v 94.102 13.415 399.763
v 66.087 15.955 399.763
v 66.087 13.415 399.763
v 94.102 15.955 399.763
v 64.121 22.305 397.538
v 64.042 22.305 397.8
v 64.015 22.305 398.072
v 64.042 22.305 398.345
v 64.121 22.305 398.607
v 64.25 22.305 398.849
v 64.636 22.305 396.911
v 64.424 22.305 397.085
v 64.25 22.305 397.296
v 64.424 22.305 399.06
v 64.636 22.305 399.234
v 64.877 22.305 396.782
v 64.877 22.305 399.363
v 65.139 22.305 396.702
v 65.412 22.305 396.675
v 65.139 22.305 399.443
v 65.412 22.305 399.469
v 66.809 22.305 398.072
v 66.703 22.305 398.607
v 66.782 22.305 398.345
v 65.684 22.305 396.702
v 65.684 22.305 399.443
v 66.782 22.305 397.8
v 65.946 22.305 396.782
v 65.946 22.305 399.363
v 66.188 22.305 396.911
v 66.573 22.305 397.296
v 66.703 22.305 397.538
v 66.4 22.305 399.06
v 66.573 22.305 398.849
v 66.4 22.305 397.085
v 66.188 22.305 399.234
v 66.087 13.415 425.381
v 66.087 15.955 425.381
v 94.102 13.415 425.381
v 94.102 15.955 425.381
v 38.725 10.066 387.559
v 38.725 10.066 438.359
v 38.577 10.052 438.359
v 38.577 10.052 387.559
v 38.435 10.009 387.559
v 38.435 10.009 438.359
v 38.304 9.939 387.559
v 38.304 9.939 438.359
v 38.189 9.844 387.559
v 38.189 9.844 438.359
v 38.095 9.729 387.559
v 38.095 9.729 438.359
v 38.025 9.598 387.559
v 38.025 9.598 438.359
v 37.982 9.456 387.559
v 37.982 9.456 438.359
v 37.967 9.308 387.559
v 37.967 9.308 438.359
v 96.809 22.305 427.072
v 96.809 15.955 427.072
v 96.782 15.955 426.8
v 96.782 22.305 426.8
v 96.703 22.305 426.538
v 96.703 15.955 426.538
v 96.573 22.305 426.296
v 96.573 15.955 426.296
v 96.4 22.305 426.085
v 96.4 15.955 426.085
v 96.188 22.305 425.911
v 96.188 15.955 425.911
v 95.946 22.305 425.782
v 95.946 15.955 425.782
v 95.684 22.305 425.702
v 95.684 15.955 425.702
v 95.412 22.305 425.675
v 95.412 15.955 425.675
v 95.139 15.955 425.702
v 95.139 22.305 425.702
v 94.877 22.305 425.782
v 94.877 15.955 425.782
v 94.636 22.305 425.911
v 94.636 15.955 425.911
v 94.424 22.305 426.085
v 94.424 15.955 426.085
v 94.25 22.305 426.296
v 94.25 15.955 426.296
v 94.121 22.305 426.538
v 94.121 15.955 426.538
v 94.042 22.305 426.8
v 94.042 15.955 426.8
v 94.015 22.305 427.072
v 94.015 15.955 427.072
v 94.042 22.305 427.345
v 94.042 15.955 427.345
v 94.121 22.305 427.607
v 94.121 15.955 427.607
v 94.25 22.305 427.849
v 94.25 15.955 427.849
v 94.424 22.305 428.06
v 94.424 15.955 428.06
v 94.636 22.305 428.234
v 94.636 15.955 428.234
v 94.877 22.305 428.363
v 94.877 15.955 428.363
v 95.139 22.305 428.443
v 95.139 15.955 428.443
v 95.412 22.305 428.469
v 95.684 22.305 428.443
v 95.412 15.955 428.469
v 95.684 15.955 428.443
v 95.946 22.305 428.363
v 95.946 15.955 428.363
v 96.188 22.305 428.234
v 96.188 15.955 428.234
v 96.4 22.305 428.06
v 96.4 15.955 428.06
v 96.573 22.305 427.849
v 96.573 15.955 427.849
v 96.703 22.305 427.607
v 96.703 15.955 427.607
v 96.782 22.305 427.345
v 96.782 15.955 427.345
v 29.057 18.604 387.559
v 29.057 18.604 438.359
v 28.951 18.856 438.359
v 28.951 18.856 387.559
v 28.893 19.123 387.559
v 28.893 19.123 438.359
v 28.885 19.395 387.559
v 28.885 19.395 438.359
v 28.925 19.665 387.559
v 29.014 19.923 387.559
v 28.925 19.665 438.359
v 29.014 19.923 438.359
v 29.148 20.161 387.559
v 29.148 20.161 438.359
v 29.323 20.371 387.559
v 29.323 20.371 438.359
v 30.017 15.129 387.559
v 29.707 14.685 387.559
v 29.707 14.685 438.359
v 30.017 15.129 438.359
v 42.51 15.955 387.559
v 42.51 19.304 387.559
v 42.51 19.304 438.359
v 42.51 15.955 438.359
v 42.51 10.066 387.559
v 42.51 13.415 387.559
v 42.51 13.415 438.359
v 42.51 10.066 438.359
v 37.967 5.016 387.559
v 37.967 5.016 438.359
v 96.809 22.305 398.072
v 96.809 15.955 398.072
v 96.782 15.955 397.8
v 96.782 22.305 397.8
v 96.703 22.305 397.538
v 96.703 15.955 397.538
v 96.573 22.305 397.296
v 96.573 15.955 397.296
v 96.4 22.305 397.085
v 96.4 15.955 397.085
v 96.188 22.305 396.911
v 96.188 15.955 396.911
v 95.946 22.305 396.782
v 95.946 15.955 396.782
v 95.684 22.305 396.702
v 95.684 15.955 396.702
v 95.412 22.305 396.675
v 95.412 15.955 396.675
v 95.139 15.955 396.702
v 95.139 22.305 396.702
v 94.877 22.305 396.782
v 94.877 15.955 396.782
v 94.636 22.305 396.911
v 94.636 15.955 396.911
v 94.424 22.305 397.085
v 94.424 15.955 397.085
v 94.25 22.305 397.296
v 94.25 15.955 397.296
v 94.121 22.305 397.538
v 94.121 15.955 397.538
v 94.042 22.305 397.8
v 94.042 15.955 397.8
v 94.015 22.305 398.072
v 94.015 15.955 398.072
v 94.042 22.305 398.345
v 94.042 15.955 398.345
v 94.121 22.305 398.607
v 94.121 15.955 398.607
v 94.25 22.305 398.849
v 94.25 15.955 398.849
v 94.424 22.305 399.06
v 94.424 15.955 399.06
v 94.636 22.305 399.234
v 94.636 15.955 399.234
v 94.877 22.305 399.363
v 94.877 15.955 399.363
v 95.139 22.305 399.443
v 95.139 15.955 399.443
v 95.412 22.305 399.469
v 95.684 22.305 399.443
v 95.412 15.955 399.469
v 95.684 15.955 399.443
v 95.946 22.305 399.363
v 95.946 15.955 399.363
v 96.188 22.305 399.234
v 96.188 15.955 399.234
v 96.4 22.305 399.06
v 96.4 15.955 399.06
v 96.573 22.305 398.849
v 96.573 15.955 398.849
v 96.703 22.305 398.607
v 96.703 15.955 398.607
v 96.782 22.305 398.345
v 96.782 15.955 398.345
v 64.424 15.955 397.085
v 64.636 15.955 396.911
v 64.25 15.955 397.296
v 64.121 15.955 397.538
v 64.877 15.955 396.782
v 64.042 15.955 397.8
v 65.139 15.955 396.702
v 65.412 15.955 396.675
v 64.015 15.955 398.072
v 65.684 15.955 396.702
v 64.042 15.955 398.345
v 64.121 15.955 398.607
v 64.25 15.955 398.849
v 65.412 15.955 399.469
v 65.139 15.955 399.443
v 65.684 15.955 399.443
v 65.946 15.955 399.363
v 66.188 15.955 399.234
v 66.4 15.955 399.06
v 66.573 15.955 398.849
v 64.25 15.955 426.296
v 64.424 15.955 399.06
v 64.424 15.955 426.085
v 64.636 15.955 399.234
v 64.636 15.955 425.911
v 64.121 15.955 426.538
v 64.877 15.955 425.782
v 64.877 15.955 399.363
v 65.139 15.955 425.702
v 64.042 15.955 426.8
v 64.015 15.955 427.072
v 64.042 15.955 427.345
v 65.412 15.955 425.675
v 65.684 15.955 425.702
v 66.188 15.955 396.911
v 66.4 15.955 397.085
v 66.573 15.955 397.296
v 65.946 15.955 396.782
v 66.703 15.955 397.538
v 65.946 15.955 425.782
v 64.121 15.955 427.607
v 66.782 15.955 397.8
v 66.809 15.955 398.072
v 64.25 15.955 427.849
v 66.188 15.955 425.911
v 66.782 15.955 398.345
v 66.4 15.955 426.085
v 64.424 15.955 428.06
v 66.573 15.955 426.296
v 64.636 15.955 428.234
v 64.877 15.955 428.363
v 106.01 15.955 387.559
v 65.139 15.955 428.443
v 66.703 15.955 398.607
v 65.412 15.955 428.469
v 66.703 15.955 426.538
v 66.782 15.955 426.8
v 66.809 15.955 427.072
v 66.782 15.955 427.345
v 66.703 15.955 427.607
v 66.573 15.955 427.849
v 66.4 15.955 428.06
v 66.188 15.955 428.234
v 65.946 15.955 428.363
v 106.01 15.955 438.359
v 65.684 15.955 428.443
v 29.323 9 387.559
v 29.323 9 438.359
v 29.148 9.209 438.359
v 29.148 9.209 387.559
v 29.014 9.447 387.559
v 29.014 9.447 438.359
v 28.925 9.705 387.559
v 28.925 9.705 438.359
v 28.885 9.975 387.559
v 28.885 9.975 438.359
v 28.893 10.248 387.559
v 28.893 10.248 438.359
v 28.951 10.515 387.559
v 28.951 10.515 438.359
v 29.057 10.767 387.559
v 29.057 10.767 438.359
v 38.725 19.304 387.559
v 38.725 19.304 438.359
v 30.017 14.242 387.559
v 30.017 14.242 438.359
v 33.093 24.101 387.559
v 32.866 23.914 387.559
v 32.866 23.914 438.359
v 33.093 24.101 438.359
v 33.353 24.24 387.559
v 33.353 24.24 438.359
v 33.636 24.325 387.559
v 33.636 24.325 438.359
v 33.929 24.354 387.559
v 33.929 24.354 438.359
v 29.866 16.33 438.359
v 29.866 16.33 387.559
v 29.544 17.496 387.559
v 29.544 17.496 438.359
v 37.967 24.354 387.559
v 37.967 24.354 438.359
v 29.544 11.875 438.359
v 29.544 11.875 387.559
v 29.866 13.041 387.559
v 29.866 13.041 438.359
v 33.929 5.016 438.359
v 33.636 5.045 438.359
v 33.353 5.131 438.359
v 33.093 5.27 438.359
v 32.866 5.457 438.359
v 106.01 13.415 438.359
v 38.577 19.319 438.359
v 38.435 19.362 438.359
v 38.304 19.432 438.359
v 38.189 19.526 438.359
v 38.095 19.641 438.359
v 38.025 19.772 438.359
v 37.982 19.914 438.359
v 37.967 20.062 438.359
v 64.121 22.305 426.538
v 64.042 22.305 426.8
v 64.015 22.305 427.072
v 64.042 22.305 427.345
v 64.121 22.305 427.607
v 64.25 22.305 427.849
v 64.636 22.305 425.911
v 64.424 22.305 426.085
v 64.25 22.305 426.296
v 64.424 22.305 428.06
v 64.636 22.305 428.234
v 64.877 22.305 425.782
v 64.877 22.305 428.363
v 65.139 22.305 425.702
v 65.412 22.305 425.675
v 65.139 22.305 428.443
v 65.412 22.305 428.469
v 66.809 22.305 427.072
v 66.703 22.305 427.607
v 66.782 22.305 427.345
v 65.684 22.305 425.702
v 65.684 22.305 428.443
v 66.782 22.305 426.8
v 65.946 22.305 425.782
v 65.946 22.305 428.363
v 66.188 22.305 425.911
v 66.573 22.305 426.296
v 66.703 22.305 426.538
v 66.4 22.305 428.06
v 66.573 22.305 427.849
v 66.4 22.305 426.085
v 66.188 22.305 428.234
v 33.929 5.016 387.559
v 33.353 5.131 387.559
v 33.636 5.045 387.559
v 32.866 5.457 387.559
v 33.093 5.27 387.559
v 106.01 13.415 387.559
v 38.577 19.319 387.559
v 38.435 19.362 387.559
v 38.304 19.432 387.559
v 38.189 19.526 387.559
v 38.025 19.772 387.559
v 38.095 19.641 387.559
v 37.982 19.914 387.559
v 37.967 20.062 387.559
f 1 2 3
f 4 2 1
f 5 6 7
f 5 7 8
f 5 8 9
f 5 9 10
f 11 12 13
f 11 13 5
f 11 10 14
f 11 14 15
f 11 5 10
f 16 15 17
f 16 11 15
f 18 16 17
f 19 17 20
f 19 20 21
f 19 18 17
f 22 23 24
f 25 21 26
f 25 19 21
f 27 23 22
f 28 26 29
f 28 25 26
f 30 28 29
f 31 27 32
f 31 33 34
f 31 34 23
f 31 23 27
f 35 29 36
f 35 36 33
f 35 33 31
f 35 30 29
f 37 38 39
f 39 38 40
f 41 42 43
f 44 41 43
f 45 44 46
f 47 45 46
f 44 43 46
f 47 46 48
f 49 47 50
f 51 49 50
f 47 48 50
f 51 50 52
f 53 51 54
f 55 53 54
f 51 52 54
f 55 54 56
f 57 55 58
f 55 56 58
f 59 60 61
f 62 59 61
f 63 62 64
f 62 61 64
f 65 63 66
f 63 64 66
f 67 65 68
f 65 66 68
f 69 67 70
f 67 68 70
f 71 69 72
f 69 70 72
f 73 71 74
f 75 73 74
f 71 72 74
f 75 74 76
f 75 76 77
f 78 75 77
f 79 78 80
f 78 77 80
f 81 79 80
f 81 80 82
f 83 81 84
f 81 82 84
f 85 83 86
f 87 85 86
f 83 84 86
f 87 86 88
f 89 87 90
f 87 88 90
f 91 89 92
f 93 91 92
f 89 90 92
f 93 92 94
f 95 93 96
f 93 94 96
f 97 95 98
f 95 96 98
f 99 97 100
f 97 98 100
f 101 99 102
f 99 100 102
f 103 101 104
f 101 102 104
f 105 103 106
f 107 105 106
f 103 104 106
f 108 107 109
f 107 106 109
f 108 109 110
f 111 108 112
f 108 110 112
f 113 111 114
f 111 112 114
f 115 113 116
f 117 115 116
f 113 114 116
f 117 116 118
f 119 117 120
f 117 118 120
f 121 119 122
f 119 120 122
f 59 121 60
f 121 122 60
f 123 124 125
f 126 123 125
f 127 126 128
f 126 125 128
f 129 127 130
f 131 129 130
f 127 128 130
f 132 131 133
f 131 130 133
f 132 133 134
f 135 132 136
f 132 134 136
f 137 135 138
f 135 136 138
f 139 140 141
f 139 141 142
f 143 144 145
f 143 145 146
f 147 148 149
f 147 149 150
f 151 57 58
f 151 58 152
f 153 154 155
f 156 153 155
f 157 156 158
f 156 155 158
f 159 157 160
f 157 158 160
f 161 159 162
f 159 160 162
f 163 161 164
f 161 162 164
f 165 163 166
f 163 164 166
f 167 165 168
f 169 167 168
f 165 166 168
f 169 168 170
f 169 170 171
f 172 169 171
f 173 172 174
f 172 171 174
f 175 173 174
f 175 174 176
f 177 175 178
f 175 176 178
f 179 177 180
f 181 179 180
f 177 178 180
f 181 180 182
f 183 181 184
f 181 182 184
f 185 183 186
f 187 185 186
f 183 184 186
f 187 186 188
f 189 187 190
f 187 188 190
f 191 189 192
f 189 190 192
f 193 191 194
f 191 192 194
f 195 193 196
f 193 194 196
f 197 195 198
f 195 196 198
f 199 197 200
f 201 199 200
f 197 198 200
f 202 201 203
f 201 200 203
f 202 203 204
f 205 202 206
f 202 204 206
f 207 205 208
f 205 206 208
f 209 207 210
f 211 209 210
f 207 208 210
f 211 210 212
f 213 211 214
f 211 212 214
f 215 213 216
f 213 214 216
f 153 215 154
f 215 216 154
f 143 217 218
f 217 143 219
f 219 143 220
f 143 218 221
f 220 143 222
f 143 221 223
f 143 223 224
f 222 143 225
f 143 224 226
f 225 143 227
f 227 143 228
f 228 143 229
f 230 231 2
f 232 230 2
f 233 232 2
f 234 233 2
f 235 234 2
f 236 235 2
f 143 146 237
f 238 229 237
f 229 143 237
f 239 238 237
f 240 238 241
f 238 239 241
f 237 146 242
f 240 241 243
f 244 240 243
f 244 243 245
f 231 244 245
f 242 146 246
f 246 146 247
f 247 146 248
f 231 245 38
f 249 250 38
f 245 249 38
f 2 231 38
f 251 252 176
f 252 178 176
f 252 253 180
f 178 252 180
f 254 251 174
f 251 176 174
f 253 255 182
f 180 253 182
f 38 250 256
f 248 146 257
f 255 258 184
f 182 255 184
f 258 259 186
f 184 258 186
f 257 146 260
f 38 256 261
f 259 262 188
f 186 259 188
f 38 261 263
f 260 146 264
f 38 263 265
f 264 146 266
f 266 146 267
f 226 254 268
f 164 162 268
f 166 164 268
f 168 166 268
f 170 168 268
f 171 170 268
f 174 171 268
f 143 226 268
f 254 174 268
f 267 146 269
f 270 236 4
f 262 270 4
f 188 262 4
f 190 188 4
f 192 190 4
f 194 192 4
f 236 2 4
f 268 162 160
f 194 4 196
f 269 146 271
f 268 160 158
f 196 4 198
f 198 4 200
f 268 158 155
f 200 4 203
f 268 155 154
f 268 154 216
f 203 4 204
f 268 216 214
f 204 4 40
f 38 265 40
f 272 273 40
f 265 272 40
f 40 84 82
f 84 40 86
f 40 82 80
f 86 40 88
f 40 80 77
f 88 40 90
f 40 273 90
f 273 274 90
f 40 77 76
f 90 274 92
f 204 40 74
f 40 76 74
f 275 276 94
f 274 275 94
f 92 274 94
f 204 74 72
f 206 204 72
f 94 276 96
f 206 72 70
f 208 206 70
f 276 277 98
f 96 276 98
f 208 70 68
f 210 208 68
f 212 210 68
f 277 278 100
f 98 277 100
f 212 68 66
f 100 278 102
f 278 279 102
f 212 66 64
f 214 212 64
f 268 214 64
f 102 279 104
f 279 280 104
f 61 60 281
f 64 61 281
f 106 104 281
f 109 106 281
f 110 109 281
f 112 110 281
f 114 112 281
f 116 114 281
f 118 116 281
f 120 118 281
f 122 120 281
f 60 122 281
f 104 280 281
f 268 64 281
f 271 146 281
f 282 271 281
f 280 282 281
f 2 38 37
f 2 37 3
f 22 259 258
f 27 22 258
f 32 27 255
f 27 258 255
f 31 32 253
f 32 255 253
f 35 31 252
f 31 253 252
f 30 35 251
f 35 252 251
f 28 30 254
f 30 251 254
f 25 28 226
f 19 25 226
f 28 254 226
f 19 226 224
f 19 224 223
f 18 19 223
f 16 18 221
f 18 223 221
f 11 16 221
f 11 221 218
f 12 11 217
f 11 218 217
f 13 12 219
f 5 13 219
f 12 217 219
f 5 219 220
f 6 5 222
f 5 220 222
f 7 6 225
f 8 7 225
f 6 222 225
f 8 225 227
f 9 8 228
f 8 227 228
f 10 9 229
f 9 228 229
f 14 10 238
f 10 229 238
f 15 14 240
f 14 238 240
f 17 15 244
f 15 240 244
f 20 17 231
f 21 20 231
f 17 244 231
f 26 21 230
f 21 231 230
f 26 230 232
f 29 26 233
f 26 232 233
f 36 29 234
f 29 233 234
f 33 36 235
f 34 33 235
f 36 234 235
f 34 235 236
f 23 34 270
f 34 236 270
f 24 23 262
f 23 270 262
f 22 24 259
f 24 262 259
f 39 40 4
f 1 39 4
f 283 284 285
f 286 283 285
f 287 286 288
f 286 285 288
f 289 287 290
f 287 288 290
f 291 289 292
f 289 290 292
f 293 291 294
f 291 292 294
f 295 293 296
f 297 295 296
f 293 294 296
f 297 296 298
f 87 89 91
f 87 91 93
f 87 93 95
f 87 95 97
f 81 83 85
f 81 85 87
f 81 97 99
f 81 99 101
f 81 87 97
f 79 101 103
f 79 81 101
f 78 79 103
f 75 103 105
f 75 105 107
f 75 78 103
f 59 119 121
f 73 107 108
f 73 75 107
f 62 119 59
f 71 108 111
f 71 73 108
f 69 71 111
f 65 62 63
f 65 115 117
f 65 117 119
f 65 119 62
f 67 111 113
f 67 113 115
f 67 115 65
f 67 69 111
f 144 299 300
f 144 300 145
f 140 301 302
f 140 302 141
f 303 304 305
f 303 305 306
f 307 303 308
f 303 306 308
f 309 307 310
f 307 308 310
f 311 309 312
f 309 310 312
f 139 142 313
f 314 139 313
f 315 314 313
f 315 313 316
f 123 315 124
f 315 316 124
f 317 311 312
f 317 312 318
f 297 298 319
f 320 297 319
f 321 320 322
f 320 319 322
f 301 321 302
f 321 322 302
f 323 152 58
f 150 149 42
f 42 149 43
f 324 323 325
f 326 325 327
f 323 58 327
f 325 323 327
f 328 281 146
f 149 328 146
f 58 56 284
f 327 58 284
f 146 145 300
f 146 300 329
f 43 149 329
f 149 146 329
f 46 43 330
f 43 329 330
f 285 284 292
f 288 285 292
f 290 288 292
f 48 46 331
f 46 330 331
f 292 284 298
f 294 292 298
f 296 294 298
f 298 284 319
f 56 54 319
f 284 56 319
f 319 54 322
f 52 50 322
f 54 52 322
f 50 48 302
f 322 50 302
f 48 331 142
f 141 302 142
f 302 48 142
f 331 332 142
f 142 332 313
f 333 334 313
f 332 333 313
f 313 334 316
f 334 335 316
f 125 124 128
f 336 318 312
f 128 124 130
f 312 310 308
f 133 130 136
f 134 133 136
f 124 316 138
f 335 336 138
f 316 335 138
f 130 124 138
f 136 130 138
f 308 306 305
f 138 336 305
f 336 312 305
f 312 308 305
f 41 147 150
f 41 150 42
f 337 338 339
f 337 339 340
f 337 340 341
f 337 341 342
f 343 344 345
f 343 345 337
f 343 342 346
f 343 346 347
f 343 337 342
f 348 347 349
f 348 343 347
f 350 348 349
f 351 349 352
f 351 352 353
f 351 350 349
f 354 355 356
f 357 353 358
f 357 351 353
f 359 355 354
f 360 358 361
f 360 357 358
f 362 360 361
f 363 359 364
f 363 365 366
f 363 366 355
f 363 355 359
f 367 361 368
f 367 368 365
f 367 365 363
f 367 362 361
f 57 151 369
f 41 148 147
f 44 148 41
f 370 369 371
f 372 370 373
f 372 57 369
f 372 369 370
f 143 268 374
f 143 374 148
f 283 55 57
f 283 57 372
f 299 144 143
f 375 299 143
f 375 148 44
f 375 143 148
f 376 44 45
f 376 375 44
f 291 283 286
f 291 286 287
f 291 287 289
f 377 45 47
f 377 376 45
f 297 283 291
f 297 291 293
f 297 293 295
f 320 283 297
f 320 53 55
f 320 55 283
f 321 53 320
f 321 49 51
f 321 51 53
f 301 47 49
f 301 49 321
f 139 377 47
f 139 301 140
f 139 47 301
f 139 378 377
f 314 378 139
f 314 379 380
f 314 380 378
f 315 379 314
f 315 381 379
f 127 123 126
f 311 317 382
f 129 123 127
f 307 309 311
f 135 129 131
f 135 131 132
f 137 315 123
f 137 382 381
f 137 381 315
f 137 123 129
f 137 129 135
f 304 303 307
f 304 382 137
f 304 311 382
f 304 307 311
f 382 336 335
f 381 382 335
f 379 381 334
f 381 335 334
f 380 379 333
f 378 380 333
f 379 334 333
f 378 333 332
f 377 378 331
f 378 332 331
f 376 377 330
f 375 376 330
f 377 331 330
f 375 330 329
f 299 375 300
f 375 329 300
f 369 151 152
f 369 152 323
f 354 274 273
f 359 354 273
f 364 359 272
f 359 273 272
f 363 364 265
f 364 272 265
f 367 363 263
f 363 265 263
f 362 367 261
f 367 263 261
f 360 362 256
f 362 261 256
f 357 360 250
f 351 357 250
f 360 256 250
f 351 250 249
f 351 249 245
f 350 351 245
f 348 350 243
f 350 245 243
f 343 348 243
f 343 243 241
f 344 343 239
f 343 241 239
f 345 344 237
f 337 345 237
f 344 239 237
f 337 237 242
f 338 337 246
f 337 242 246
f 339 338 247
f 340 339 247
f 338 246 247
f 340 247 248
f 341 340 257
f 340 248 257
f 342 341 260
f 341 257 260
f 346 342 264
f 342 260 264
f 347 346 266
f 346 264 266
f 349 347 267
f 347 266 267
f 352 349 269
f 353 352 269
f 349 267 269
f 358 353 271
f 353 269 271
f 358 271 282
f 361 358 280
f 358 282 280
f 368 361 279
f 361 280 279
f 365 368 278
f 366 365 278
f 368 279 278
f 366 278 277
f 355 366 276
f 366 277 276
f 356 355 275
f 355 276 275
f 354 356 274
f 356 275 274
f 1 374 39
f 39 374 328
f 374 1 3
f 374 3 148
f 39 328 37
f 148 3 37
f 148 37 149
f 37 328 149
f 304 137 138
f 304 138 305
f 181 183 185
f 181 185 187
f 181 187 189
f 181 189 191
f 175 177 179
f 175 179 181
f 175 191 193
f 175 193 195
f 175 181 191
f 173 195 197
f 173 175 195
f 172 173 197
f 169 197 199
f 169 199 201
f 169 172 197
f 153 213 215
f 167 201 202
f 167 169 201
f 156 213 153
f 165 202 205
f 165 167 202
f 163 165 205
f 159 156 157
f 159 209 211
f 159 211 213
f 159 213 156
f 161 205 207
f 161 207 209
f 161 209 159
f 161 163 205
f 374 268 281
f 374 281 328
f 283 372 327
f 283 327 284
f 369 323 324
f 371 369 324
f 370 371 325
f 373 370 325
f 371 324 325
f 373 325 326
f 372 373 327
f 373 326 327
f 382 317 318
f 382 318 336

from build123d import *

# Parameters (mm, degrees)
BOSS_EXTRUDE1_DEPTH = 50.8
SKETCH3_R           = 1.397
BOSS_EXTRUDE2_DEPTH = 6.35
SKETCH4_W           = 28.015
SKETCH4_H           = 25.618
CUT_EXTRUDE1_DEPTH  = 11.939


with BuildPart() as part:
    # Sketch1 → Boss-Extrude1 (new body)
    with BuildSketch(Plane.XY.offset(438.358905075)):
        with BuildLine():
            Line((42.509706517, 19.30434166), (42.509706517, 15.95534166))
            Line((42.509706517, 15.95534166), (106.009706517, 15.95534166))
            Line((106.009706517, 15.95534166), (106.009706517, 13.41534166))
            Line((106.009706517, 13.41534166), (42.509706517, 13.41534166))
            Line((42.509706517, 13.41534166), (42.509706517, 10.06634166))
            Line((42.509706517, 10.06634166), (38.725206517, 10.06634166))
            ThreePointArc((38.725206517, 10.06634166), (38.189219577, 9.8443286), (37.967206517, 9.30834166))
            Line((37.967206517, 9.30834166), (37.967206517, 5.01634166))
            Line((37.967206517, 5.01634166), (33.928999082, 5.01634166))
            ThreePointArc((33.928999082, 5.01634166), (33.3534432, 5.130826843), (32.865510483, 5.456853061))
            Line((32.865510483, 5.456853061), (29.322559963, 8.999803581))
            ThreePointArc((29.322559963, 8.999803581), (28.898807275, 9.839396326), (29.056588326, 10.766535722))
            ThreePointArc((29.056588326, 10.766535722), (29.726160528, 12.451998876), (30.017474414, 14.24204055))
            Line((30.017474414, 14.24204055), (29.707071635, 14.68534166))
            Line((29.707071635, 14.68534166), (30.017474414, 15.128642769))
            ThreePointArc((30.017474414, 15.128642769), (29.726160528, 16.918684443), (29.056588326, 18.604147597))
            ThreePointArc((29.056588326, 18.604147597), (28.898807275, 19.531286993), (29.322559963, 20.370879739))
            Line((29.322559963, 20.370879739), (32.865510483, 23.913830259))
            ThreePointArc((32.865510483, 23.913830259), (33.3534432, 24.239856477), (33.928999082, 24.35434166))
            Line((33.928999082, 24.35434166), (37.967206517, 24.35434166))
            Line((37.967206517, 24.35434166), (37.967206517, 20.06234166))
            ThreePointArc((37.967206517, 20.06234166), (38.189219577, 19.526354719), (38.725206517, 19.30434166))
            Line((38.725206517, 19.30434166), (42.509706517, 19.30434166))
        make_face()
    extrude(amount=-BOSS_EXTRUDE1_DEPTH)

    # Sketch3 → Boss-Extrude2 (add)
    with BuildSketch(Plane(origin=(0, 15.95534166, 0), x_dir=(1, 0, 0), z_dir=(0, 1, 0))):
        with Locations((65.411874918, -398.072421398)):
            Circle(SKETCH3_R)
        with Locations((95.411874918, -398.072421398)):
            Circle(SKETCH3_R)
        with Locations((95.411874918, -427.072421398)):
            Circle(SKETCH3_R)
        with Locations((65.411874918, -427.072421398)):
            Circle(SKETCH3_R)
    extrude(amount=BOSS_EXTRUDE2_DEPTH)

    # Sketch4 → Cut-Extrude1 (cut, through all)
    with BuildSketch(Plane(origin=(0, 15.95534166, 0), x_dir=(1, 0, 0), z_dir=(0, 1, 0))):
        with Locations((80.094374918, -412.572421398)):
            Rectangle(SKETCH4_W, SKETCH4_H)
    extrude(amount=-CUT_EXTRUDE1_DEPTH, mode=Mode.SUBTRACT)


solid = part.part
